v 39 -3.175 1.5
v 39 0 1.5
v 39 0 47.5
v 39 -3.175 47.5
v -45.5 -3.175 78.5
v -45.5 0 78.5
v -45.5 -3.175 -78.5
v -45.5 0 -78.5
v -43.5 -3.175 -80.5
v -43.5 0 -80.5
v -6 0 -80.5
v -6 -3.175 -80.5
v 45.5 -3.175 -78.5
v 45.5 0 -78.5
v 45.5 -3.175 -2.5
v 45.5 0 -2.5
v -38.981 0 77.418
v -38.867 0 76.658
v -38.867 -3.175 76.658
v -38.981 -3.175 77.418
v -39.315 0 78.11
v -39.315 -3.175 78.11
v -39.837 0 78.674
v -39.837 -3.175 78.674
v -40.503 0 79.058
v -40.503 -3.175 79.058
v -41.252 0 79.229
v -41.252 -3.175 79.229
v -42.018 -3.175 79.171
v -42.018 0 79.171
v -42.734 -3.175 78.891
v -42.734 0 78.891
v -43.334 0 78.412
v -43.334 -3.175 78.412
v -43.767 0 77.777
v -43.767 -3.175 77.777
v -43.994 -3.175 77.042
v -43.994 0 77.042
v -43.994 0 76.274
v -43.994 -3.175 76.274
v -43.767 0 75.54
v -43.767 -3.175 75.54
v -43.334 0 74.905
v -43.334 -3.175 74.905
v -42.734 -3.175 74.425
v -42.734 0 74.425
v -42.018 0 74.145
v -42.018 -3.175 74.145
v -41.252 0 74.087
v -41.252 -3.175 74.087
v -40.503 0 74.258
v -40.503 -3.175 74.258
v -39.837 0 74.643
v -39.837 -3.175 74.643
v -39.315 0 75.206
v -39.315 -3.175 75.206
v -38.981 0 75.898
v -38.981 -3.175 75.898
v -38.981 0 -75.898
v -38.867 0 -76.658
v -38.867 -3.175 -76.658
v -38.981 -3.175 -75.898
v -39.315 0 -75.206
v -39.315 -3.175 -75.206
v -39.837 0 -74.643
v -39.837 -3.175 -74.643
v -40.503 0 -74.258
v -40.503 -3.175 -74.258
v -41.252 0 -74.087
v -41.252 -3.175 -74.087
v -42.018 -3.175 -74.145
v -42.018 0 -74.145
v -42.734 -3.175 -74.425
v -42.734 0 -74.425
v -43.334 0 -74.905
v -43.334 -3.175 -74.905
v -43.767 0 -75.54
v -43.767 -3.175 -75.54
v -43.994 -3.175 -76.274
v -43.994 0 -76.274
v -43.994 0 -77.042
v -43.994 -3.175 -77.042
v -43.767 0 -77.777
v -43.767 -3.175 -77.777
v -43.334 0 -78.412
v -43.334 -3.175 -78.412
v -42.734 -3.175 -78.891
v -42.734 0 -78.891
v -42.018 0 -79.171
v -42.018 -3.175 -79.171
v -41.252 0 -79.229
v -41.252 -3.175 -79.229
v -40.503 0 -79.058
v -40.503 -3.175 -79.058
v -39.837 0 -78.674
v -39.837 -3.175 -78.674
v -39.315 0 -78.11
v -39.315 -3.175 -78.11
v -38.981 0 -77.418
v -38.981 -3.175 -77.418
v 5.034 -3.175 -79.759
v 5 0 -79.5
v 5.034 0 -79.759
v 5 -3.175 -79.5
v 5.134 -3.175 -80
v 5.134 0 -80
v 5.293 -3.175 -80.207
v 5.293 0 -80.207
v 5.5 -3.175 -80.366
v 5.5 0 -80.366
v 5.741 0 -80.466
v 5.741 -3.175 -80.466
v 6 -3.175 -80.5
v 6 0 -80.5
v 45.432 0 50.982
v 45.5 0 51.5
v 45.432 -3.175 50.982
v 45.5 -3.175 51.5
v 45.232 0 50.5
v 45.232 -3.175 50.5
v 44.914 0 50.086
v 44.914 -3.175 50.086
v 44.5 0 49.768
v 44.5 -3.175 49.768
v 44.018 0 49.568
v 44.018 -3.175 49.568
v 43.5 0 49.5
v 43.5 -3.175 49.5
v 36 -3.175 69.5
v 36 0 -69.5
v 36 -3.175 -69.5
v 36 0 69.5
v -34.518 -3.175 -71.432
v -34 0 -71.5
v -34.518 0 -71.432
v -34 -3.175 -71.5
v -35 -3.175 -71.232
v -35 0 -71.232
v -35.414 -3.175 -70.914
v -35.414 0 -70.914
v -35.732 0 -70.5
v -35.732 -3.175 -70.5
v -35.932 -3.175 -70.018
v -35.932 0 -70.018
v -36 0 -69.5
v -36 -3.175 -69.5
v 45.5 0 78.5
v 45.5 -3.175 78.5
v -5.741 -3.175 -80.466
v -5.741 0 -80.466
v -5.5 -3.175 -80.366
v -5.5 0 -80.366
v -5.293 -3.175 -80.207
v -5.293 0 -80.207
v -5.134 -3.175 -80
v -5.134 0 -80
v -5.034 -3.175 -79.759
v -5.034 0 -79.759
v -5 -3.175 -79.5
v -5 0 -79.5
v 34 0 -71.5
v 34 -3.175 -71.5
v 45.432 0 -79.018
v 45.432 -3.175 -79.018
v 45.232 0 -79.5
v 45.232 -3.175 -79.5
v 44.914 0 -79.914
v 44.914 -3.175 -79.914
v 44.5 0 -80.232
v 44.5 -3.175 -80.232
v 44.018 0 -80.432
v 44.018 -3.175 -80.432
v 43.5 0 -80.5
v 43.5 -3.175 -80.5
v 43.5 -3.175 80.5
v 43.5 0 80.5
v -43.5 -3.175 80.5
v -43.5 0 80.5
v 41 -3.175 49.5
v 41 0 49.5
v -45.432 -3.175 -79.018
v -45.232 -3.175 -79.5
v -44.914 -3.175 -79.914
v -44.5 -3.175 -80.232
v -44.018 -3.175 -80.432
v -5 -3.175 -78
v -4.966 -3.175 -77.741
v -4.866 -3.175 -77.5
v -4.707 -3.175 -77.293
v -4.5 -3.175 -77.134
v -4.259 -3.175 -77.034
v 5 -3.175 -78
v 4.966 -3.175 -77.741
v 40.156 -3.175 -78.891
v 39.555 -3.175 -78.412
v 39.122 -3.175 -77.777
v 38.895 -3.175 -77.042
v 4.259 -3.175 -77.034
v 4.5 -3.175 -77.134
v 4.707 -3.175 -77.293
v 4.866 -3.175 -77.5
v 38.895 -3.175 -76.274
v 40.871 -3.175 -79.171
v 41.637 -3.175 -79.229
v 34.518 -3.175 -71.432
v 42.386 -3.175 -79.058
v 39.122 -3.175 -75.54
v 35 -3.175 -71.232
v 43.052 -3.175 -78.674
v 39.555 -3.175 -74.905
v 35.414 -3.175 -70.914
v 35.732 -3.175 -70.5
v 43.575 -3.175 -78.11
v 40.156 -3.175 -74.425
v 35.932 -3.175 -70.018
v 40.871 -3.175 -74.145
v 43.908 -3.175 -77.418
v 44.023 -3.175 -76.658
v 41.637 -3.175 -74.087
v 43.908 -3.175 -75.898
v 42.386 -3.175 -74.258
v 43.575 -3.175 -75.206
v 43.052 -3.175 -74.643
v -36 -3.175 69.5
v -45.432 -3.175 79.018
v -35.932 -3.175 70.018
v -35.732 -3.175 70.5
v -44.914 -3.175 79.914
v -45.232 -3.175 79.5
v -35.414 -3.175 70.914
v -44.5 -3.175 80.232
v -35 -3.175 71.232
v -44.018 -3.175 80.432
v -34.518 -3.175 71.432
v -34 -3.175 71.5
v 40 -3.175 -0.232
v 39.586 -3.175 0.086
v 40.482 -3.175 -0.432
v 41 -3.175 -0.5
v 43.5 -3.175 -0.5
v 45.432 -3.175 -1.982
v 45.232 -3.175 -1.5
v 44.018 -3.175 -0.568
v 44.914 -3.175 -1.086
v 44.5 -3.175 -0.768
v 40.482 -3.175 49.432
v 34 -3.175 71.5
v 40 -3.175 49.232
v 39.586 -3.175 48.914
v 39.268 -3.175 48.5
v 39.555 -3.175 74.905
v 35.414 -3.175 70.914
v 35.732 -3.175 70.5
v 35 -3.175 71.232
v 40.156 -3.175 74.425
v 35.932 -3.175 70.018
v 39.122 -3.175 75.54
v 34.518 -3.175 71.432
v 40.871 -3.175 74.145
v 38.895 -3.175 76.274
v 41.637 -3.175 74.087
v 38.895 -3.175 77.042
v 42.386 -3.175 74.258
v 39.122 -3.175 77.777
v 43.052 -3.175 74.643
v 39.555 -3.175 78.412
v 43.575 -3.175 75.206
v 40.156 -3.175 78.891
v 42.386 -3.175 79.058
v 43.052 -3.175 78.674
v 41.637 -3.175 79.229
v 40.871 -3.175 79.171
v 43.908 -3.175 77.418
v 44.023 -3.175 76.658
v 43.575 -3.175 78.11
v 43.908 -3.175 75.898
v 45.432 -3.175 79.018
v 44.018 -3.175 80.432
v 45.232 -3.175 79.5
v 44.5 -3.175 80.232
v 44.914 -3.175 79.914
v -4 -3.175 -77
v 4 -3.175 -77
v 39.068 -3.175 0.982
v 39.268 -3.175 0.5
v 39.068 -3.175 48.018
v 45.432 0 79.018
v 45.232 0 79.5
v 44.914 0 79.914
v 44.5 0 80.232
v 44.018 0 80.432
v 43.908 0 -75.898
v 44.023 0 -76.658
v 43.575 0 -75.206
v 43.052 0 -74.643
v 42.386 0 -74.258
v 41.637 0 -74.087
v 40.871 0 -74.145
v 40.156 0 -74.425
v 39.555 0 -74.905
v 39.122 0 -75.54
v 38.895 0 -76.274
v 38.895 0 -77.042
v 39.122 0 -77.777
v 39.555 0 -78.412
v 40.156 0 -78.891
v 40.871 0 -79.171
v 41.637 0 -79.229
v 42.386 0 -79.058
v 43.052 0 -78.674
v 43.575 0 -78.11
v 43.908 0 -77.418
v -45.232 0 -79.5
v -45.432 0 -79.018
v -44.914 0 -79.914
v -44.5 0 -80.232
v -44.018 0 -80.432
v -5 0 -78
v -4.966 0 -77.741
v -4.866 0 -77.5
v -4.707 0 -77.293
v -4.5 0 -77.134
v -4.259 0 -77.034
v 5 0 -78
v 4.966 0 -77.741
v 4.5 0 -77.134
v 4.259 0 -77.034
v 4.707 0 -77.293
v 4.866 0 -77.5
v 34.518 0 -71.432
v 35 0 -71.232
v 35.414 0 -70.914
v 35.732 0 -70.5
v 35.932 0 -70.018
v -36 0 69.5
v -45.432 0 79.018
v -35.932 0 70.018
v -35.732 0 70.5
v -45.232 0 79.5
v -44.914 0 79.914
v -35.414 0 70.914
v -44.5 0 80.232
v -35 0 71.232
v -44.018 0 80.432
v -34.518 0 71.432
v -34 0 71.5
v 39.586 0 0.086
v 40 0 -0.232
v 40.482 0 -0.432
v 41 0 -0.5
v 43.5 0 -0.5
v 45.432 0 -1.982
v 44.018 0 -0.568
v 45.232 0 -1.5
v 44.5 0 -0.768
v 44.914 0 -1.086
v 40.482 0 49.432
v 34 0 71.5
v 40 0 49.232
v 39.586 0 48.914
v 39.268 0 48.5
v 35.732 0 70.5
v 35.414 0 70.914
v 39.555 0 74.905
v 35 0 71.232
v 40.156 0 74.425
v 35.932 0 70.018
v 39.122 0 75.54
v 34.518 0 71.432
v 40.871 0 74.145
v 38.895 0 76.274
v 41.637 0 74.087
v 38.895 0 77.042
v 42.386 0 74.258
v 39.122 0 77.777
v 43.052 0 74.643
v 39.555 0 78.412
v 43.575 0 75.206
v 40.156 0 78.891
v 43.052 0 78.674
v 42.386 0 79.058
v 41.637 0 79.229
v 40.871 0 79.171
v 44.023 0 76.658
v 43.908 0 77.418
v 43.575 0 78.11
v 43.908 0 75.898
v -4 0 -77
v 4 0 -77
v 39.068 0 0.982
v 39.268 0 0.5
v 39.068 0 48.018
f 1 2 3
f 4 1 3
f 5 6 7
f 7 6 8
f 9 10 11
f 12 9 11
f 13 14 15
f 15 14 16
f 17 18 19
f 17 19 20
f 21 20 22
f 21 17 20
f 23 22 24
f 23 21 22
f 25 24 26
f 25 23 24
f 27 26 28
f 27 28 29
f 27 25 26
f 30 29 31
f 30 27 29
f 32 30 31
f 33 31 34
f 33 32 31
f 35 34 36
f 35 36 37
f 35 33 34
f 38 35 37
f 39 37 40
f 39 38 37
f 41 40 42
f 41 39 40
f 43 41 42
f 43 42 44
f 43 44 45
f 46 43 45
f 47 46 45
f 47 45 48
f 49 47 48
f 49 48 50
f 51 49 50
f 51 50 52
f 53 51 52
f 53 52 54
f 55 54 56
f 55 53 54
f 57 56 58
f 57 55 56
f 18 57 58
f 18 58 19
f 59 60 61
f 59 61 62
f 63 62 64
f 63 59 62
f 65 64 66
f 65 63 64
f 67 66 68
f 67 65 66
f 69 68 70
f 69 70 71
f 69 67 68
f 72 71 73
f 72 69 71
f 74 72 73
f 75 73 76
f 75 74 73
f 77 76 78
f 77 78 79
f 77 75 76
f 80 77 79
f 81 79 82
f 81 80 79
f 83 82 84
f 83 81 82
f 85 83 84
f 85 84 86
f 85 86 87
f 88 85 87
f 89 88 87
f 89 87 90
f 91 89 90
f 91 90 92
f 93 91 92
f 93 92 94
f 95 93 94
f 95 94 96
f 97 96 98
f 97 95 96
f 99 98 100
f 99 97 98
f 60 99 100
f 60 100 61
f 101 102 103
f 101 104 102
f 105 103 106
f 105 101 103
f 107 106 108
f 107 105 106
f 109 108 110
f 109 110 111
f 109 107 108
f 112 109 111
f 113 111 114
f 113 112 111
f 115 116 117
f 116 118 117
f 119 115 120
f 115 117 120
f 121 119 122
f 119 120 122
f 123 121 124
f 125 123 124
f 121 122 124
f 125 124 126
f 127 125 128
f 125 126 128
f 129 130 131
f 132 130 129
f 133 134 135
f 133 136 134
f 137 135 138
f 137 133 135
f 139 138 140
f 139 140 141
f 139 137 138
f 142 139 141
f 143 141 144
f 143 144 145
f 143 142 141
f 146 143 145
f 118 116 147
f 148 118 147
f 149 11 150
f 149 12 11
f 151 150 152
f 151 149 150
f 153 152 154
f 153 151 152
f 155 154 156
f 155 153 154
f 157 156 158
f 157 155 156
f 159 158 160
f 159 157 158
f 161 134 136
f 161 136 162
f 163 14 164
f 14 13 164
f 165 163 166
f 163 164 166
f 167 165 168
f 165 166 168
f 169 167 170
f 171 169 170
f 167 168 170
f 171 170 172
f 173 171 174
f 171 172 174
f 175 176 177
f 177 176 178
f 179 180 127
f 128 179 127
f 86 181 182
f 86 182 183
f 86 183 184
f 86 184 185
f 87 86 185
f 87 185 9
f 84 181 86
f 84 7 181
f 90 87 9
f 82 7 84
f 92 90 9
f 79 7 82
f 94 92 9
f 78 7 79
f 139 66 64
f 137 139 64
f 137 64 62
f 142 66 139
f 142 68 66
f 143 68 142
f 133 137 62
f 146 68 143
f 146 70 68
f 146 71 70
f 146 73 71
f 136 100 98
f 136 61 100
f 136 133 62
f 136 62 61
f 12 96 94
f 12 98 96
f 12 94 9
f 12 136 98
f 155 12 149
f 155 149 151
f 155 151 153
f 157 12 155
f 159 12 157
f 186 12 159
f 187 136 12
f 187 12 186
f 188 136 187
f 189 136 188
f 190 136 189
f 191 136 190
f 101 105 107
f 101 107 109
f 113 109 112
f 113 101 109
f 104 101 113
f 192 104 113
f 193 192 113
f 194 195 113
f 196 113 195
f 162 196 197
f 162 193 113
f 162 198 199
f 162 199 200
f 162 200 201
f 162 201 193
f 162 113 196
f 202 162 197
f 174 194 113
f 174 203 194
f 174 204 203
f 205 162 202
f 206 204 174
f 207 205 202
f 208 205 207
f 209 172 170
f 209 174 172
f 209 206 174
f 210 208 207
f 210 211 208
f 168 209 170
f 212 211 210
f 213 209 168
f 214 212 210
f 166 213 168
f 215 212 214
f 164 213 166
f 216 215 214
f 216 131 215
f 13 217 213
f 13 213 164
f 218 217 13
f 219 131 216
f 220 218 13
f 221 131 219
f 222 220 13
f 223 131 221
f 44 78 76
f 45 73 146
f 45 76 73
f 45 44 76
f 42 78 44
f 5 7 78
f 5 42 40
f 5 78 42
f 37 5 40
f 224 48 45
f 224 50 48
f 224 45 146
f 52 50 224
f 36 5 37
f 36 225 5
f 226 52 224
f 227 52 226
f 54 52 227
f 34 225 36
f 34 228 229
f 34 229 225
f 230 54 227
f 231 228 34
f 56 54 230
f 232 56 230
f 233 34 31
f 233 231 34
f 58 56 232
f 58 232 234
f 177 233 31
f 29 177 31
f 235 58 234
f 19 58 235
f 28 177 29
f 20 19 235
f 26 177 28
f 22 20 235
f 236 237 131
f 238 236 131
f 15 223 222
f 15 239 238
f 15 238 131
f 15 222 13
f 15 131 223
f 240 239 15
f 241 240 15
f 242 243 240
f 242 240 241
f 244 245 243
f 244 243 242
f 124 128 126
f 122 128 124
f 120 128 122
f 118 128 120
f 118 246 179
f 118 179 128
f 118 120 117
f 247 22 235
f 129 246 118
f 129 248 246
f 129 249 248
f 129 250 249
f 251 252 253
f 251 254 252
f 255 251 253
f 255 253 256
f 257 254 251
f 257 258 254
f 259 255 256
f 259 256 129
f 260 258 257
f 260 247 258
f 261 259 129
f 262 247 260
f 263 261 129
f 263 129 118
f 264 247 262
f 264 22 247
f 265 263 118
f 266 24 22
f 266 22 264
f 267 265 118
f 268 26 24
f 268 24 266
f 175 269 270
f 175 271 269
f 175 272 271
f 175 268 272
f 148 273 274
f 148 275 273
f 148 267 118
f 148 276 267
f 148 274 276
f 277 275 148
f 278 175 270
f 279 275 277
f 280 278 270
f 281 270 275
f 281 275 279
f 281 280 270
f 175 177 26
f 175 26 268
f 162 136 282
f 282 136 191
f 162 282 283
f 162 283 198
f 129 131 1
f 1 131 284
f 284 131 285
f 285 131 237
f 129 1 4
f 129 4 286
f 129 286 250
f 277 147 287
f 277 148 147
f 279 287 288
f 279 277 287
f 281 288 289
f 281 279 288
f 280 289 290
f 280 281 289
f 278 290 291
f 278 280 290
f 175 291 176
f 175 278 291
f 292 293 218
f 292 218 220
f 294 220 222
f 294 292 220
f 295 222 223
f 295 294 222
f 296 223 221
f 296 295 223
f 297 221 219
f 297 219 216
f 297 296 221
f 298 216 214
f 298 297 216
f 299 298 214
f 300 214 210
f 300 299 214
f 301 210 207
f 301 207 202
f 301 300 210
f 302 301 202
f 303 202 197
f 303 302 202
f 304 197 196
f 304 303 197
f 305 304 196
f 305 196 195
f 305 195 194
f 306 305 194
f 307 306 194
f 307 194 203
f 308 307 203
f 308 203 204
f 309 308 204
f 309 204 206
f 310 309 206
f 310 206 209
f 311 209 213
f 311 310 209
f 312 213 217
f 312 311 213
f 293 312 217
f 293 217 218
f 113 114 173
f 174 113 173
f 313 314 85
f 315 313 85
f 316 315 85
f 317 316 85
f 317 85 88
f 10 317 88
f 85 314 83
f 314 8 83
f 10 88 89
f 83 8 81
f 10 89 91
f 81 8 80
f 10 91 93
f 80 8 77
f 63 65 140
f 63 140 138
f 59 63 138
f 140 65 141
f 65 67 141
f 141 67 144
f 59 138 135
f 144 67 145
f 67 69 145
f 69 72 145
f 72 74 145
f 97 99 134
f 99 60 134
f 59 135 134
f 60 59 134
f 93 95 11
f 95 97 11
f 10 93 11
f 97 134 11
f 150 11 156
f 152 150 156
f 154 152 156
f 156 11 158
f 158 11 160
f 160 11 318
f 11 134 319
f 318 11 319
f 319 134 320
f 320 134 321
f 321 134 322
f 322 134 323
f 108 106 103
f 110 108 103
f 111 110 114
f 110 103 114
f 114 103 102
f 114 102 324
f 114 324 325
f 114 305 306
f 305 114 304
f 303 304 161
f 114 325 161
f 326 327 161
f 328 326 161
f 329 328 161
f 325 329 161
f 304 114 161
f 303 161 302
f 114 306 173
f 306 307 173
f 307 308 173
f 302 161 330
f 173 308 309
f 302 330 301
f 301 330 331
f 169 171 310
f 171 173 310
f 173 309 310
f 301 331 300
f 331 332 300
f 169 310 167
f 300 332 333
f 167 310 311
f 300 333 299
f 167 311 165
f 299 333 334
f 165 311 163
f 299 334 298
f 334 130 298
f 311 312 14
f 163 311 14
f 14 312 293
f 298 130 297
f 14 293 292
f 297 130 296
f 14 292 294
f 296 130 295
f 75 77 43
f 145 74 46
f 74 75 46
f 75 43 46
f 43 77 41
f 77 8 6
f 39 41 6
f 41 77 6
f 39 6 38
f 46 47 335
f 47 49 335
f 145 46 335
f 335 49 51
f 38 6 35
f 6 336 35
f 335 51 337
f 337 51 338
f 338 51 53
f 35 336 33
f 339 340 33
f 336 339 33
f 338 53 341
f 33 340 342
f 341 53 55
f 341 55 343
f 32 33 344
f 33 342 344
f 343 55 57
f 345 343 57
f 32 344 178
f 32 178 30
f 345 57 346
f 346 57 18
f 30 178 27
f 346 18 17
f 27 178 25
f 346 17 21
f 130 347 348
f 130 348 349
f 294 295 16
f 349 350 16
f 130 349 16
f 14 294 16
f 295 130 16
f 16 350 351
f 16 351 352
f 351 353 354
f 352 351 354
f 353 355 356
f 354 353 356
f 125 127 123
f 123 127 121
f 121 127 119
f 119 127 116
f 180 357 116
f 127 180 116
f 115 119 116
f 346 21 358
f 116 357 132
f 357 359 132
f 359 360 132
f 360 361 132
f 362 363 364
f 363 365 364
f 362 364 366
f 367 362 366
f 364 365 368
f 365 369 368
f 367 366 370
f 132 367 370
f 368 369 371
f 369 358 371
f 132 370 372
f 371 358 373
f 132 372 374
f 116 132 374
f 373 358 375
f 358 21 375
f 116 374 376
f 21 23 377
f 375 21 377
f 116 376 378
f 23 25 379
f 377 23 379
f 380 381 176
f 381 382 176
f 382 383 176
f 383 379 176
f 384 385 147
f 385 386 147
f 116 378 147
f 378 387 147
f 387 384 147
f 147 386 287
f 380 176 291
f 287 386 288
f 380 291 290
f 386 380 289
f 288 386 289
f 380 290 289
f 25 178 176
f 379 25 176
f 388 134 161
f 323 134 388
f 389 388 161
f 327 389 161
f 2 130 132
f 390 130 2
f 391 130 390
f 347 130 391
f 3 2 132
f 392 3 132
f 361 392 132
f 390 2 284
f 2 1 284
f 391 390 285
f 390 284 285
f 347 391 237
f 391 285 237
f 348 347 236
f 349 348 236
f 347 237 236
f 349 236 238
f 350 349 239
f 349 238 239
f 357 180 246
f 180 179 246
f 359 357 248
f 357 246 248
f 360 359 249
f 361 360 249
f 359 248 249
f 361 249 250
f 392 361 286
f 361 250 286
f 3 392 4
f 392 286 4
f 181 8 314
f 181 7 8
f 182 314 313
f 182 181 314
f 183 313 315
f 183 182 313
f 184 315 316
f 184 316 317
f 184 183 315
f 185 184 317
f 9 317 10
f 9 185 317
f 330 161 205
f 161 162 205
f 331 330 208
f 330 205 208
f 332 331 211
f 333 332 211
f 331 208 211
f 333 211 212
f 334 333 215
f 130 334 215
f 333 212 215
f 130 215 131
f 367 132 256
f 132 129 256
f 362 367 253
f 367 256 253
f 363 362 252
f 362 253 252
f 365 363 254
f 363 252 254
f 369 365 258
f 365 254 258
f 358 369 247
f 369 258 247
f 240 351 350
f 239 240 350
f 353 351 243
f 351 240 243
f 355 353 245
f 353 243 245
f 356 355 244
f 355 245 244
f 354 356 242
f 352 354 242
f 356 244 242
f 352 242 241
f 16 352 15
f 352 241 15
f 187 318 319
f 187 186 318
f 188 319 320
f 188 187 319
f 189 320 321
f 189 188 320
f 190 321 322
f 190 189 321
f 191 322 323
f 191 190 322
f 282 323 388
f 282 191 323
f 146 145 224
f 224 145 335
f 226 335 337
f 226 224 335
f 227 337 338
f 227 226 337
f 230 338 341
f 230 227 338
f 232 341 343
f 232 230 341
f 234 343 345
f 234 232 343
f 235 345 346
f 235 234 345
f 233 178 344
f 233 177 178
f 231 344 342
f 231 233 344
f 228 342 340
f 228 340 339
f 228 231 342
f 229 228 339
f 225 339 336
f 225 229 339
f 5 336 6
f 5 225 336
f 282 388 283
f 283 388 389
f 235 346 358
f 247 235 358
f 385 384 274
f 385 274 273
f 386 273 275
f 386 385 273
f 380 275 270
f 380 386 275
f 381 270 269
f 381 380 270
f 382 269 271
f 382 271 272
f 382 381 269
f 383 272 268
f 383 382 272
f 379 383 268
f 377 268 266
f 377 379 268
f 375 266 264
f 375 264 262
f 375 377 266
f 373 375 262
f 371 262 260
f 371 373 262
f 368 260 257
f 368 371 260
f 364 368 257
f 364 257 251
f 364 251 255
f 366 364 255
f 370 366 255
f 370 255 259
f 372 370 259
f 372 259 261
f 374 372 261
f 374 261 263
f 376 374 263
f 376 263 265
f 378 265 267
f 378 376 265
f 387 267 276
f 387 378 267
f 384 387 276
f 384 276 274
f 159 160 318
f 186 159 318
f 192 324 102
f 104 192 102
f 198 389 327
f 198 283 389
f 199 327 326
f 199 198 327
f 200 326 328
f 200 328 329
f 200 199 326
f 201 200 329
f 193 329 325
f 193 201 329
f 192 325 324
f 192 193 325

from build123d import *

# Parameters (mm, degrees)
F1_R     = 2.578
F1_W     = 72
F1_H     = 143
F2_DEPTH = 3.175
F3_R     = 2
F4_R     = 1


with BuildPart() as f2:
    # F1 (on Front) → F2 (new body)
    with BuildSketch(Plane.XZ):
        Polygon((45.5, 49.5), (45.5, 80.5), (-45.5, 80.5), (-45.5, -80.5), (-5, -80.5), (-5, -77), (5, -77), (5, -80.5), (45.5, -80.5), (45.5, -0.5), (39, -0.5), (39, 49.5), align=None)
        with Locations((-41.444645, -76.658085)):
            Circle(F1_R, mode=Mode.SUBTRACT)
        with Locations((41.444645, -76.658085)):
            Circle(F1_R, mode=Mode.SUBTRACT)
        Rectangle(F1_W, F1_H, mode=Mode.SUBTRACT)
        with Locations((-41.444645, 76.658085)):
            Circle(F1_R, mode=Mode.SUBTRACT)
        with Locations((41.444645, 76.658085)):
            Circle(F1_R, mode=Mode.SUBTRACT)
    extrude(amount=F2_DEPTH)

    # F3
    f3_edges = [f2.edges().sort_by_distance(p)[0] for p in [
        (-36, -1.5875, 71.5),
        (36, -1.5875, 71.5),
        (-45.5, -1.5875, 80.5),
        (45.5, -1.5875, 80.5),
        (45.5, -1.5875, 49.5),
        (39, -1.5875, 49.5),
        (45.5, -1.5875, -0.5),
        (39, -1.5875, -0.5),
        (-36, -1.5875, -71.5),
        (-45.5, -1.5875, -80.5),
        (45.5, -1.5875, -80.5),
        (36, -1.5875, -71.5),
    ]]
    fillet(f3_edges, radius=F3_R)

    # F4
    f4_edges = [f2.edges().sort_by_distance(p)[0] for p in [
        (5, -1.5875, -80.5),
        (5, -1.5875, -77),
        (-5, -1.5875, -77),
        (-5, -1.5875, -80.5),
    ]]
    fillet(f4_edges, radius=F4_R)


solid = f2.part
